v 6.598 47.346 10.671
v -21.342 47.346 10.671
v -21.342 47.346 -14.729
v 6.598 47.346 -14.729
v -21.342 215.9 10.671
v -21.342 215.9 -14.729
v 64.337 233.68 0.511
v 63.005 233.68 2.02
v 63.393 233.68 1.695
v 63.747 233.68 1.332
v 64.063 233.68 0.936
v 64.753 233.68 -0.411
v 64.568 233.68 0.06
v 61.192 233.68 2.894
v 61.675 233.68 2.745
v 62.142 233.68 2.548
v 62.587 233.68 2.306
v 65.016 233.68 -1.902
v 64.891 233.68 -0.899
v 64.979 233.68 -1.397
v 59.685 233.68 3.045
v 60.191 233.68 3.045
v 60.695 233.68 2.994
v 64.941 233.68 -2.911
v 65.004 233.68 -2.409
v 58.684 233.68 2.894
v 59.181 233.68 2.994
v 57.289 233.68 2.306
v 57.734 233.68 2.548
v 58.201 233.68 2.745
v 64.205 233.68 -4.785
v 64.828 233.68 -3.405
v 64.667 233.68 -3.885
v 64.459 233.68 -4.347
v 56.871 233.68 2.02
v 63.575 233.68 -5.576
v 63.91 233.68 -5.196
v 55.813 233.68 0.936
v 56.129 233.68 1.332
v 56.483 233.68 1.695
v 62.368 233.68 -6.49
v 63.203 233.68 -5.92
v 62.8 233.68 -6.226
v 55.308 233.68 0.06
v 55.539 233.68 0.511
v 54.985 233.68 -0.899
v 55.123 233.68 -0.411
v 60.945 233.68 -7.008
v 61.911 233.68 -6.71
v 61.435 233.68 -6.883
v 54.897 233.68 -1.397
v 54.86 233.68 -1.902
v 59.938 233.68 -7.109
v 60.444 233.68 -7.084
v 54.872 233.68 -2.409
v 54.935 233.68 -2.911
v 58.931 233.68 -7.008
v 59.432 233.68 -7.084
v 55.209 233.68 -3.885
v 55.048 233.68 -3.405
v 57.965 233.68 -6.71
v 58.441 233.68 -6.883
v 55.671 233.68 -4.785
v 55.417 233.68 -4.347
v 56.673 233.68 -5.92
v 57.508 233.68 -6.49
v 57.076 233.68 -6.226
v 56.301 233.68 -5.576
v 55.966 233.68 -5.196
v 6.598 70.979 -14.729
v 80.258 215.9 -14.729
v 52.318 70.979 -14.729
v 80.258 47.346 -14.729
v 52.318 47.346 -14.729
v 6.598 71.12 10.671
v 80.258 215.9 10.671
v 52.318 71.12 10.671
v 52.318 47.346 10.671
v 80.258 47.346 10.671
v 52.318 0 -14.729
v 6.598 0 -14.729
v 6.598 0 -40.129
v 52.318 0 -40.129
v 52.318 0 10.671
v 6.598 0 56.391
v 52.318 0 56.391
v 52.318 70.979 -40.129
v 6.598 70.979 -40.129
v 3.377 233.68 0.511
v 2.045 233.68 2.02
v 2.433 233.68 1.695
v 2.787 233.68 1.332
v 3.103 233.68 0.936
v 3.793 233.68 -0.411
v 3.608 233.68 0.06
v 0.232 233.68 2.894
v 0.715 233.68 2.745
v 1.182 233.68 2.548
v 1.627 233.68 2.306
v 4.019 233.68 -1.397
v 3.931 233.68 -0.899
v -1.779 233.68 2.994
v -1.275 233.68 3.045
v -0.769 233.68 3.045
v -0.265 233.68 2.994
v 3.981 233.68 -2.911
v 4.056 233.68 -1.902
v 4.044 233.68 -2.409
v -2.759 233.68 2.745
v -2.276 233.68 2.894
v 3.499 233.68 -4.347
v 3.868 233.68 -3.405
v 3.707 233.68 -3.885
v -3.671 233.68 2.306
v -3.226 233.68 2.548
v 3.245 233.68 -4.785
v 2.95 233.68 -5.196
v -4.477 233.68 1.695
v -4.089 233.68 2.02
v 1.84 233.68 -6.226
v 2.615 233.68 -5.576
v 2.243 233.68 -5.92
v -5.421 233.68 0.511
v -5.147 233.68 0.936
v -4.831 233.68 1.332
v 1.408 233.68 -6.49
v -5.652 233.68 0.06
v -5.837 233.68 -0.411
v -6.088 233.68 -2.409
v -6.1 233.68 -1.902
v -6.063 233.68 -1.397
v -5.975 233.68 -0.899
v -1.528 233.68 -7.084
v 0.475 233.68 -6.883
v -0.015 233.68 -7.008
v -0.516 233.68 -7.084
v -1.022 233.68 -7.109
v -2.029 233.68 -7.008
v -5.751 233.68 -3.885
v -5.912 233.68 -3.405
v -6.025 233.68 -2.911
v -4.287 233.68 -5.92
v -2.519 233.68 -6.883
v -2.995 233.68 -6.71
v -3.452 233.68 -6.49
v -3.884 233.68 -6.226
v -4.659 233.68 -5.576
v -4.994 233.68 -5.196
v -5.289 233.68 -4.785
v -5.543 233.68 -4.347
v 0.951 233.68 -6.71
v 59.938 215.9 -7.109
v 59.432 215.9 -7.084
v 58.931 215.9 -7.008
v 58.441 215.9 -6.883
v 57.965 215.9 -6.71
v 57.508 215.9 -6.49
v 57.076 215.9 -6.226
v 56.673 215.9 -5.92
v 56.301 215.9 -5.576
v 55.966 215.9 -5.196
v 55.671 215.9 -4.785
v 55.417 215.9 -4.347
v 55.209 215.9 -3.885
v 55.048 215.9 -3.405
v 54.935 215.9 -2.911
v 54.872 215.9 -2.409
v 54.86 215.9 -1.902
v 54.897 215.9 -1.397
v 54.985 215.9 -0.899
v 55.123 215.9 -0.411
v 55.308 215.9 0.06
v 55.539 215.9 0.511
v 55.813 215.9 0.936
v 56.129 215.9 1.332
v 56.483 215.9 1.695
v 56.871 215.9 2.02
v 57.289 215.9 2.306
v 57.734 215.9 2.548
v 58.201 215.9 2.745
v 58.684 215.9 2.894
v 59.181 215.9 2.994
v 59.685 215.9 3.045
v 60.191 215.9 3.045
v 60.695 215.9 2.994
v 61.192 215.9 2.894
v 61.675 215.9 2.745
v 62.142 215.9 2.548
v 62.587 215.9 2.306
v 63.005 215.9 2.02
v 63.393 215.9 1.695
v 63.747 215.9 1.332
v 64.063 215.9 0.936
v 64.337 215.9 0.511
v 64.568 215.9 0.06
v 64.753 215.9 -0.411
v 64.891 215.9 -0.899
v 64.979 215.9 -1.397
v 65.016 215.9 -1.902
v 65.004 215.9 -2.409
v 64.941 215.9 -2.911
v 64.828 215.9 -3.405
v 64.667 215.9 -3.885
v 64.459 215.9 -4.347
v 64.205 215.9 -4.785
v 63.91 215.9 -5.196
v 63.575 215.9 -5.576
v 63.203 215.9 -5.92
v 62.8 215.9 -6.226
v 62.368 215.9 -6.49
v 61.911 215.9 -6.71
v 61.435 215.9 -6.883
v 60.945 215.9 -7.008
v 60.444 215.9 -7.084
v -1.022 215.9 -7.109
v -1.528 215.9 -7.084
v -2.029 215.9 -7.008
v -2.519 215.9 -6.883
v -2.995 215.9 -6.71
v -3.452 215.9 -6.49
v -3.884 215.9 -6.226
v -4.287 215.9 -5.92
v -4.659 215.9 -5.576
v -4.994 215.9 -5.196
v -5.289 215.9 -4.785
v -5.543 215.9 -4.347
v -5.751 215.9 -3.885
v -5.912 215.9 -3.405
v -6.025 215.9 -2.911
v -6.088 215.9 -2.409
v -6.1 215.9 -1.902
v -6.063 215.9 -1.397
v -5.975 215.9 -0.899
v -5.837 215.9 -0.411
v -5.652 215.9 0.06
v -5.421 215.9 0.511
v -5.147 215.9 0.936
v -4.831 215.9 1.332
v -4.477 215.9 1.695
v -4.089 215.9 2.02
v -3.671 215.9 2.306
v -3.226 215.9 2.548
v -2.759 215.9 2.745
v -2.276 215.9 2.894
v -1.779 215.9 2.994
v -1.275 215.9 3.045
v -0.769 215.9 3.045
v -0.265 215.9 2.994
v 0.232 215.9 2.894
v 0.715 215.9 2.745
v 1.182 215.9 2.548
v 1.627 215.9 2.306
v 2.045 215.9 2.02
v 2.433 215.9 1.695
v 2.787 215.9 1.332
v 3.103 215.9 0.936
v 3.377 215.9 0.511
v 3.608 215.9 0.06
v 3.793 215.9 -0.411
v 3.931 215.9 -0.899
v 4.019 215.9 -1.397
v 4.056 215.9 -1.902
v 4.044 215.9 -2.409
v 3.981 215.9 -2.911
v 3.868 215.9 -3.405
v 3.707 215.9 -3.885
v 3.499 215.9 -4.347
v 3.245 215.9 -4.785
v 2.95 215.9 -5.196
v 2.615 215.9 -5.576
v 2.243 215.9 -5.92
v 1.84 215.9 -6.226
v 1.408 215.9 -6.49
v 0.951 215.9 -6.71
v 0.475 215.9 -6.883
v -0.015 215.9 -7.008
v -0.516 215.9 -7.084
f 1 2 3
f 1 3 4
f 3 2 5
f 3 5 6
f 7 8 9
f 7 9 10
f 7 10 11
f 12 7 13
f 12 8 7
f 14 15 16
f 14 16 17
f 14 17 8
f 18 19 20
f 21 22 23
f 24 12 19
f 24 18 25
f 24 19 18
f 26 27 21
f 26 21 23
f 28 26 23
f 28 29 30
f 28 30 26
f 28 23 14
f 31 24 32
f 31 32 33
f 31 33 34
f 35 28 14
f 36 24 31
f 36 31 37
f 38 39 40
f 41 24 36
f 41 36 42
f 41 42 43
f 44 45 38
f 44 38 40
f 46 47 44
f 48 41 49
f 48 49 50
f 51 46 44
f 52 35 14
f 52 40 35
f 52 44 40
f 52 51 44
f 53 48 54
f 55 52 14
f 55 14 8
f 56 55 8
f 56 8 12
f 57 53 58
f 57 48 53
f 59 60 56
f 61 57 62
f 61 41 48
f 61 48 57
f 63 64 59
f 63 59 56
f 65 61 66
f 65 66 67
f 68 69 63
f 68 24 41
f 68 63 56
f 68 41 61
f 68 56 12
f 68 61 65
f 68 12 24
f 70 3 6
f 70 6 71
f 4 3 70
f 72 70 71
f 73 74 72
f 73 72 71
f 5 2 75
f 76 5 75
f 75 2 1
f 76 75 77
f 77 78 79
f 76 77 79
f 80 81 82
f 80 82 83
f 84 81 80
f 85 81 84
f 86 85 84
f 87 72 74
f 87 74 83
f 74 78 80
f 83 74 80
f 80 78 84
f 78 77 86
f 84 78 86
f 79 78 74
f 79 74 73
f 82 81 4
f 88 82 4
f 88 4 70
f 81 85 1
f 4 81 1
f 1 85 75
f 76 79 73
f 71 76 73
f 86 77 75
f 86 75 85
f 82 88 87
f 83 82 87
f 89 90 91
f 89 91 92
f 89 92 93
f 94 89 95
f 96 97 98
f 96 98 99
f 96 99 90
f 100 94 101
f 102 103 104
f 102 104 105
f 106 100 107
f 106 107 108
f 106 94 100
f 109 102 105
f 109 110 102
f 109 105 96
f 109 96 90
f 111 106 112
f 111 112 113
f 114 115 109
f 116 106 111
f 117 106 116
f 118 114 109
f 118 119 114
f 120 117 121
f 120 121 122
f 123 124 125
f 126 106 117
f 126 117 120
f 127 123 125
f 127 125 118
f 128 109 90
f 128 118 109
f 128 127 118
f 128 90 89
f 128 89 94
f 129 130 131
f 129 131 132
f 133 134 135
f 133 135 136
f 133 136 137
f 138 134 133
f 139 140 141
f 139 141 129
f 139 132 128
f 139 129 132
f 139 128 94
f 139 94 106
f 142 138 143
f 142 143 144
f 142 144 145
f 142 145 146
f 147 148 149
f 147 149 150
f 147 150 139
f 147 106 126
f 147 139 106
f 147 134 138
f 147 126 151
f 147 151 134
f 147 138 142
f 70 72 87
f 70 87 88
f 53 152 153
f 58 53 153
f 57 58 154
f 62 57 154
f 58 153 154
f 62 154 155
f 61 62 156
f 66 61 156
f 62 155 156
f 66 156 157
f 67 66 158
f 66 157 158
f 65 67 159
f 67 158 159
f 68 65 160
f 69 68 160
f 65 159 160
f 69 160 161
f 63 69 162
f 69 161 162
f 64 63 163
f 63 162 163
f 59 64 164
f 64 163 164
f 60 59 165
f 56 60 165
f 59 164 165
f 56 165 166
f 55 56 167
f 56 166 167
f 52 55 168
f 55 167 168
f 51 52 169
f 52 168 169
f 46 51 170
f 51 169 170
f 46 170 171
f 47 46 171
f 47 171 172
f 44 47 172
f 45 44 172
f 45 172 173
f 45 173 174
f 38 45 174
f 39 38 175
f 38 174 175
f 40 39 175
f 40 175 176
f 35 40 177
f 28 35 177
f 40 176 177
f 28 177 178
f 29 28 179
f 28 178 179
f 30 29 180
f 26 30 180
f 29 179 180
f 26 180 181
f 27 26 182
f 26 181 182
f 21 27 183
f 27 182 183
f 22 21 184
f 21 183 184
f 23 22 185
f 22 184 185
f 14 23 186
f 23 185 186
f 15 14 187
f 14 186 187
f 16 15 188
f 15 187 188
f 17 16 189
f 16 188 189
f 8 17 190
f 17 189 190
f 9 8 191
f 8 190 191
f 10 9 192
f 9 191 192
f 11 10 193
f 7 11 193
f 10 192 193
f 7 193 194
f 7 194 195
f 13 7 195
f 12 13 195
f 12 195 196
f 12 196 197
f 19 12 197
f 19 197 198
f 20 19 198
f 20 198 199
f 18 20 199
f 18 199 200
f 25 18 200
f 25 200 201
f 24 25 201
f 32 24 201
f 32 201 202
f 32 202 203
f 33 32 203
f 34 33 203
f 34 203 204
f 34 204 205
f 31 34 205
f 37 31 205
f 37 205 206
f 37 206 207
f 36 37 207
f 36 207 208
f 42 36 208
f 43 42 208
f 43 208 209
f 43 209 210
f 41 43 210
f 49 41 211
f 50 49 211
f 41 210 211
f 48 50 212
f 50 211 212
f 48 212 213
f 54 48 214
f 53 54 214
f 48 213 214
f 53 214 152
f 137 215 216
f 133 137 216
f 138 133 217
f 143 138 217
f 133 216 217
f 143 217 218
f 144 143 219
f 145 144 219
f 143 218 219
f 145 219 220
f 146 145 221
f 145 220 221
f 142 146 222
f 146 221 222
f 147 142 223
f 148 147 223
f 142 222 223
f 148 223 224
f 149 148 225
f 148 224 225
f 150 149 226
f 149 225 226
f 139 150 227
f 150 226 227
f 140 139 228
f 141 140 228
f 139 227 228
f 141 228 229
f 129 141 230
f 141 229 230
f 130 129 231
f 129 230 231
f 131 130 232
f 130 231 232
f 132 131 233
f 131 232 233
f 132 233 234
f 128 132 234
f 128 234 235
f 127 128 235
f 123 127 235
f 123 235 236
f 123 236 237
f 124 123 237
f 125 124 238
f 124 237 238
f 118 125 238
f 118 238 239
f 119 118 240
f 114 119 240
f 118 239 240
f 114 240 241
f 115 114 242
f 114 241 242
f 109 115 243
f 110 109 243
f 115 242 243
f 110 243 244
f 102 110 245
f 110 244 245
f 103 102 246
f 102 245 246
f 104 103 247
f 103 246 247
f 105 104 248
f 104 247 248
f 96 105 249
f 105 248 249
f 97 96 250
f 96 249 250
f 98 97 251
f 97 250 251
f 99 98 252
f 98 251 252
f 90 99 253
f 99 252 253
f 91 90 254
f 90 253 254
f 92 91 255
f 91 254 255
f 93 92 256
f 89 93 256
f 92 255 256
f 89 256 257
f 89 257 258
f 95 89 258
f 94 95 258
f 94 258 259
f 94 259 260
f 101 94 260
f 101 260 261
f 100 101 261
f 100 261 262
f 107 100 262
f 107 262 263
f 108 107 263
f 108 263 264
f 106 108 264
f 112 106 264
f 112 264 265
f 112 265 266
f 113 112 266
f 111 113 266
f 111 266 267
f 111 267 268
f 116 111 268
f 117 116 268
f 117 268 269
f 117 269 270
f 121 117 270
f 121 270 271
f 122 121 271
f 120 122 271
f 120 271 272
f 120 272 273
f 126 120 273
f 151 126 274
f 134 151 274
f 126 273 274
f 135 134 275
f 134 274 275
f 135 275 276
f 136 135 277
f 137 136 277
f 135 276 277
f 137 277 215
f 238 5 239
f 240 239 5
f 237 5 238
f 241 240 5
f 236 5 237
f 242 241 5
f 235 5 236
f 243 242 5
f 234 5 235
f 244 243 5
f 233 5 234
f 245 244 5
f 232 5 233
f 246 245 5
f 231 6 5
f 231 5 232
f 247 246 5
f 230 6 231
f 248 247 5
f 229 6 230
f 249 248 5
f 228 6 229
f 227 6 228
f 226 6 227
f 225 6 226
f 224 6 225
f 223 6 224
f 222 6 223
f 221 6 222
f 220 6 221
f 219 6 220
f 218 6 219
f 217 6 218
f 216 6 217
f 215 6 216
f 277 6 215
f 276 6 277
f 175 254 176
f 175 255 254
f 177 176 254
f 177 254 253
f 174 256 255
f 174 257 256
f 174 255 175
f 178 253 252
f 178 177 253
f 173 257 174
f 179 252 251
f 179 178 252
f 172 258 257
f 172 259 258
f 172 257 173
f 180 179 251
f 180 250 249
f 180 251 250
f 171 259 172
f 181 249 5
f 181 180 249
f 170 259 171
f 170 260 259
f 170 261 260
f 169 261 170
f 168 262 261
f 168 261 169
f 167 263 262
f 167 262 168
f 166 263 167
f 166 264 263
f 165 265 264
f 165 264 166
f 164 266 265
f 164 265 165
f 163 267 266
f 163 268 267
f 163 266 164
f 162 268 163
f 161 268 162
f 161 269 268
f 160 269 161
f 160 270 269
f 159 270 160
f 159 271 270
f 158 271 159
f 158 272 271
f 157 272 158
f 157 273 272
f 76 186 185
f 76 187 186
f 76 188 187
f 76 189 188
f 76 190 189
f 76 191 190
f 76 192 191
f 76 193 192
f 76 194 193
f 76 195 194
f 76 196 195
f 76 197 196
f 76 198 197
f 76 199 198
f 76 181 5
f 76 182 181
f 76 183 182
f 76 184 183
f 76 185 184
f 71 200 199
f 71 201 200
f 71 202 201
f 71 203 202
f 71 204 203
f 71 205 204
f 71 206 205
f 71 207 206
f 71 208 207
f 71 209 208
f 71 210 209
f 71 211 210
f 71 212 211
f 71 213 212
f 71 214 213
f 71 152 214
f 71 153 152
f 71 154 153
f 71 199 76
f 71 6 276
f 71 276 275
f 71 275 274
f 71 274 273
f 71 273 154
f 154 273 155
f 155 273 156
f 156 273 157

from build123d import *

# Parameters (mm, degrees)
SKETCH1_W           = 101.6
SKETCH1_H           = 25.4
BOSS_EXTRUDE1_DEPTH = 215.9
SKETCH2_R           = 5.08
BOSS_EXTRUDE2_DEPTH = 17.78
SKETCH3_W           = 27.94
SKETCH3_H           = 47.346080225
CUT_EXTRUDE1_DEPTH  = 27.686
SKETCH9_W           = 45.72
SKETCH9_H           = 71.12
BOSS_EXTRUDE5_DEPTH = 45.72
CUT_EXTRUDE4_DEPTH  = 45.72
BOSS_EXTRUDE6_DEPTH = 25.4


with BuildPart() as part:
    # Sketch1 → Boss-Extrude1 (new body)
    with BuildSketch(Plane(origin=(0, 0, 0), x_dir=(1, 0, 0), z_dir=(0, 1, 0))):
        with Locations((29.457987906, 2.028993953)):
            Rectangle(SKETCH1_W, SKETCH1_H)
    extrude(amount=BOSS_EXTRUDE1_DEPTH)

    # Sketch2 → Boss-Extrude2 (add)
    with BuildSketch(Plane(origin=(0, 215.9, 0), x_dir=(1, 0, 0), z_dir=(0, 1, 0))):
        with Locations(Location((-1.022012094, 2.028993953, 0), (0, 0, 90))):
            Circle(SKETCH2_R)
        with Locations(Location((59.937987906, 2.028993953, 0), (0, 0, 90))):
            Circle(SKETCH2_R)
    extrude(amount=BOSS_EXTRUDE2_DEPTH)

    # Sketch3 → Cut-Extrude1 (cut)
    with BuildSketch(Plane.XY.offset(10.671006047)):
        with Locations((-7.372012094, 23.673040113)):
            Rectangle(SKETCH3_W, SKETCH3_H)
        with Locations((66.287987906, 23.673040113)):
            Rectangle(SKETCH3_W, SKETCH3_H)
    extrude(amount=-CUT_EXTRUDE1_DEPTH, mode=Mode.SUBTRACT)

    # Sketch9 → Boss-Extrude5 (add)
    with BuildSketch(Plane.XY.offset(10.671006047)):
        with Locations((29.457987906, 35.56)):
            Rectangle(SKETCH9_W, SKETCH9_H)
    extrude(amount=BOSS_EXTRUDE5_DEPTH)

    # Sketch10 → Cut-Extrude4 (cut)
    with BuildSketch(Plane(origin=(52.317987906, 0, 0), x_dir=(0, 0, -1), z_dir=(1, 0, 0))):
        Polygon((-56.391006047, 71.12), (-10.671006047, 71.12), (-56.391006047, 0), align=None)
    extrude(amount=-CUT_EXTRUDE4_DEPTH, mode=Mode.SUBTRACT)

    # Sketch11 → Boss-Extrude6 (add)
    with BuildSketch(Plane(origin=(0, 0, -14.728993953), x_dir=(-1, 0, 0), z_dir=(0, 0, -1))):
        Polygon((-52.317987906, 47.346080225), (-52.317987906, 70.979374422), (-6.597987906, 70.979374422), (-6.597987906, 47.346080225), (-6.597987906, 0), (-52.317987906, 0), align=None)
    extrude(amount=BOSS_EXTRUDE6_DEPTH)


solid = part.part
